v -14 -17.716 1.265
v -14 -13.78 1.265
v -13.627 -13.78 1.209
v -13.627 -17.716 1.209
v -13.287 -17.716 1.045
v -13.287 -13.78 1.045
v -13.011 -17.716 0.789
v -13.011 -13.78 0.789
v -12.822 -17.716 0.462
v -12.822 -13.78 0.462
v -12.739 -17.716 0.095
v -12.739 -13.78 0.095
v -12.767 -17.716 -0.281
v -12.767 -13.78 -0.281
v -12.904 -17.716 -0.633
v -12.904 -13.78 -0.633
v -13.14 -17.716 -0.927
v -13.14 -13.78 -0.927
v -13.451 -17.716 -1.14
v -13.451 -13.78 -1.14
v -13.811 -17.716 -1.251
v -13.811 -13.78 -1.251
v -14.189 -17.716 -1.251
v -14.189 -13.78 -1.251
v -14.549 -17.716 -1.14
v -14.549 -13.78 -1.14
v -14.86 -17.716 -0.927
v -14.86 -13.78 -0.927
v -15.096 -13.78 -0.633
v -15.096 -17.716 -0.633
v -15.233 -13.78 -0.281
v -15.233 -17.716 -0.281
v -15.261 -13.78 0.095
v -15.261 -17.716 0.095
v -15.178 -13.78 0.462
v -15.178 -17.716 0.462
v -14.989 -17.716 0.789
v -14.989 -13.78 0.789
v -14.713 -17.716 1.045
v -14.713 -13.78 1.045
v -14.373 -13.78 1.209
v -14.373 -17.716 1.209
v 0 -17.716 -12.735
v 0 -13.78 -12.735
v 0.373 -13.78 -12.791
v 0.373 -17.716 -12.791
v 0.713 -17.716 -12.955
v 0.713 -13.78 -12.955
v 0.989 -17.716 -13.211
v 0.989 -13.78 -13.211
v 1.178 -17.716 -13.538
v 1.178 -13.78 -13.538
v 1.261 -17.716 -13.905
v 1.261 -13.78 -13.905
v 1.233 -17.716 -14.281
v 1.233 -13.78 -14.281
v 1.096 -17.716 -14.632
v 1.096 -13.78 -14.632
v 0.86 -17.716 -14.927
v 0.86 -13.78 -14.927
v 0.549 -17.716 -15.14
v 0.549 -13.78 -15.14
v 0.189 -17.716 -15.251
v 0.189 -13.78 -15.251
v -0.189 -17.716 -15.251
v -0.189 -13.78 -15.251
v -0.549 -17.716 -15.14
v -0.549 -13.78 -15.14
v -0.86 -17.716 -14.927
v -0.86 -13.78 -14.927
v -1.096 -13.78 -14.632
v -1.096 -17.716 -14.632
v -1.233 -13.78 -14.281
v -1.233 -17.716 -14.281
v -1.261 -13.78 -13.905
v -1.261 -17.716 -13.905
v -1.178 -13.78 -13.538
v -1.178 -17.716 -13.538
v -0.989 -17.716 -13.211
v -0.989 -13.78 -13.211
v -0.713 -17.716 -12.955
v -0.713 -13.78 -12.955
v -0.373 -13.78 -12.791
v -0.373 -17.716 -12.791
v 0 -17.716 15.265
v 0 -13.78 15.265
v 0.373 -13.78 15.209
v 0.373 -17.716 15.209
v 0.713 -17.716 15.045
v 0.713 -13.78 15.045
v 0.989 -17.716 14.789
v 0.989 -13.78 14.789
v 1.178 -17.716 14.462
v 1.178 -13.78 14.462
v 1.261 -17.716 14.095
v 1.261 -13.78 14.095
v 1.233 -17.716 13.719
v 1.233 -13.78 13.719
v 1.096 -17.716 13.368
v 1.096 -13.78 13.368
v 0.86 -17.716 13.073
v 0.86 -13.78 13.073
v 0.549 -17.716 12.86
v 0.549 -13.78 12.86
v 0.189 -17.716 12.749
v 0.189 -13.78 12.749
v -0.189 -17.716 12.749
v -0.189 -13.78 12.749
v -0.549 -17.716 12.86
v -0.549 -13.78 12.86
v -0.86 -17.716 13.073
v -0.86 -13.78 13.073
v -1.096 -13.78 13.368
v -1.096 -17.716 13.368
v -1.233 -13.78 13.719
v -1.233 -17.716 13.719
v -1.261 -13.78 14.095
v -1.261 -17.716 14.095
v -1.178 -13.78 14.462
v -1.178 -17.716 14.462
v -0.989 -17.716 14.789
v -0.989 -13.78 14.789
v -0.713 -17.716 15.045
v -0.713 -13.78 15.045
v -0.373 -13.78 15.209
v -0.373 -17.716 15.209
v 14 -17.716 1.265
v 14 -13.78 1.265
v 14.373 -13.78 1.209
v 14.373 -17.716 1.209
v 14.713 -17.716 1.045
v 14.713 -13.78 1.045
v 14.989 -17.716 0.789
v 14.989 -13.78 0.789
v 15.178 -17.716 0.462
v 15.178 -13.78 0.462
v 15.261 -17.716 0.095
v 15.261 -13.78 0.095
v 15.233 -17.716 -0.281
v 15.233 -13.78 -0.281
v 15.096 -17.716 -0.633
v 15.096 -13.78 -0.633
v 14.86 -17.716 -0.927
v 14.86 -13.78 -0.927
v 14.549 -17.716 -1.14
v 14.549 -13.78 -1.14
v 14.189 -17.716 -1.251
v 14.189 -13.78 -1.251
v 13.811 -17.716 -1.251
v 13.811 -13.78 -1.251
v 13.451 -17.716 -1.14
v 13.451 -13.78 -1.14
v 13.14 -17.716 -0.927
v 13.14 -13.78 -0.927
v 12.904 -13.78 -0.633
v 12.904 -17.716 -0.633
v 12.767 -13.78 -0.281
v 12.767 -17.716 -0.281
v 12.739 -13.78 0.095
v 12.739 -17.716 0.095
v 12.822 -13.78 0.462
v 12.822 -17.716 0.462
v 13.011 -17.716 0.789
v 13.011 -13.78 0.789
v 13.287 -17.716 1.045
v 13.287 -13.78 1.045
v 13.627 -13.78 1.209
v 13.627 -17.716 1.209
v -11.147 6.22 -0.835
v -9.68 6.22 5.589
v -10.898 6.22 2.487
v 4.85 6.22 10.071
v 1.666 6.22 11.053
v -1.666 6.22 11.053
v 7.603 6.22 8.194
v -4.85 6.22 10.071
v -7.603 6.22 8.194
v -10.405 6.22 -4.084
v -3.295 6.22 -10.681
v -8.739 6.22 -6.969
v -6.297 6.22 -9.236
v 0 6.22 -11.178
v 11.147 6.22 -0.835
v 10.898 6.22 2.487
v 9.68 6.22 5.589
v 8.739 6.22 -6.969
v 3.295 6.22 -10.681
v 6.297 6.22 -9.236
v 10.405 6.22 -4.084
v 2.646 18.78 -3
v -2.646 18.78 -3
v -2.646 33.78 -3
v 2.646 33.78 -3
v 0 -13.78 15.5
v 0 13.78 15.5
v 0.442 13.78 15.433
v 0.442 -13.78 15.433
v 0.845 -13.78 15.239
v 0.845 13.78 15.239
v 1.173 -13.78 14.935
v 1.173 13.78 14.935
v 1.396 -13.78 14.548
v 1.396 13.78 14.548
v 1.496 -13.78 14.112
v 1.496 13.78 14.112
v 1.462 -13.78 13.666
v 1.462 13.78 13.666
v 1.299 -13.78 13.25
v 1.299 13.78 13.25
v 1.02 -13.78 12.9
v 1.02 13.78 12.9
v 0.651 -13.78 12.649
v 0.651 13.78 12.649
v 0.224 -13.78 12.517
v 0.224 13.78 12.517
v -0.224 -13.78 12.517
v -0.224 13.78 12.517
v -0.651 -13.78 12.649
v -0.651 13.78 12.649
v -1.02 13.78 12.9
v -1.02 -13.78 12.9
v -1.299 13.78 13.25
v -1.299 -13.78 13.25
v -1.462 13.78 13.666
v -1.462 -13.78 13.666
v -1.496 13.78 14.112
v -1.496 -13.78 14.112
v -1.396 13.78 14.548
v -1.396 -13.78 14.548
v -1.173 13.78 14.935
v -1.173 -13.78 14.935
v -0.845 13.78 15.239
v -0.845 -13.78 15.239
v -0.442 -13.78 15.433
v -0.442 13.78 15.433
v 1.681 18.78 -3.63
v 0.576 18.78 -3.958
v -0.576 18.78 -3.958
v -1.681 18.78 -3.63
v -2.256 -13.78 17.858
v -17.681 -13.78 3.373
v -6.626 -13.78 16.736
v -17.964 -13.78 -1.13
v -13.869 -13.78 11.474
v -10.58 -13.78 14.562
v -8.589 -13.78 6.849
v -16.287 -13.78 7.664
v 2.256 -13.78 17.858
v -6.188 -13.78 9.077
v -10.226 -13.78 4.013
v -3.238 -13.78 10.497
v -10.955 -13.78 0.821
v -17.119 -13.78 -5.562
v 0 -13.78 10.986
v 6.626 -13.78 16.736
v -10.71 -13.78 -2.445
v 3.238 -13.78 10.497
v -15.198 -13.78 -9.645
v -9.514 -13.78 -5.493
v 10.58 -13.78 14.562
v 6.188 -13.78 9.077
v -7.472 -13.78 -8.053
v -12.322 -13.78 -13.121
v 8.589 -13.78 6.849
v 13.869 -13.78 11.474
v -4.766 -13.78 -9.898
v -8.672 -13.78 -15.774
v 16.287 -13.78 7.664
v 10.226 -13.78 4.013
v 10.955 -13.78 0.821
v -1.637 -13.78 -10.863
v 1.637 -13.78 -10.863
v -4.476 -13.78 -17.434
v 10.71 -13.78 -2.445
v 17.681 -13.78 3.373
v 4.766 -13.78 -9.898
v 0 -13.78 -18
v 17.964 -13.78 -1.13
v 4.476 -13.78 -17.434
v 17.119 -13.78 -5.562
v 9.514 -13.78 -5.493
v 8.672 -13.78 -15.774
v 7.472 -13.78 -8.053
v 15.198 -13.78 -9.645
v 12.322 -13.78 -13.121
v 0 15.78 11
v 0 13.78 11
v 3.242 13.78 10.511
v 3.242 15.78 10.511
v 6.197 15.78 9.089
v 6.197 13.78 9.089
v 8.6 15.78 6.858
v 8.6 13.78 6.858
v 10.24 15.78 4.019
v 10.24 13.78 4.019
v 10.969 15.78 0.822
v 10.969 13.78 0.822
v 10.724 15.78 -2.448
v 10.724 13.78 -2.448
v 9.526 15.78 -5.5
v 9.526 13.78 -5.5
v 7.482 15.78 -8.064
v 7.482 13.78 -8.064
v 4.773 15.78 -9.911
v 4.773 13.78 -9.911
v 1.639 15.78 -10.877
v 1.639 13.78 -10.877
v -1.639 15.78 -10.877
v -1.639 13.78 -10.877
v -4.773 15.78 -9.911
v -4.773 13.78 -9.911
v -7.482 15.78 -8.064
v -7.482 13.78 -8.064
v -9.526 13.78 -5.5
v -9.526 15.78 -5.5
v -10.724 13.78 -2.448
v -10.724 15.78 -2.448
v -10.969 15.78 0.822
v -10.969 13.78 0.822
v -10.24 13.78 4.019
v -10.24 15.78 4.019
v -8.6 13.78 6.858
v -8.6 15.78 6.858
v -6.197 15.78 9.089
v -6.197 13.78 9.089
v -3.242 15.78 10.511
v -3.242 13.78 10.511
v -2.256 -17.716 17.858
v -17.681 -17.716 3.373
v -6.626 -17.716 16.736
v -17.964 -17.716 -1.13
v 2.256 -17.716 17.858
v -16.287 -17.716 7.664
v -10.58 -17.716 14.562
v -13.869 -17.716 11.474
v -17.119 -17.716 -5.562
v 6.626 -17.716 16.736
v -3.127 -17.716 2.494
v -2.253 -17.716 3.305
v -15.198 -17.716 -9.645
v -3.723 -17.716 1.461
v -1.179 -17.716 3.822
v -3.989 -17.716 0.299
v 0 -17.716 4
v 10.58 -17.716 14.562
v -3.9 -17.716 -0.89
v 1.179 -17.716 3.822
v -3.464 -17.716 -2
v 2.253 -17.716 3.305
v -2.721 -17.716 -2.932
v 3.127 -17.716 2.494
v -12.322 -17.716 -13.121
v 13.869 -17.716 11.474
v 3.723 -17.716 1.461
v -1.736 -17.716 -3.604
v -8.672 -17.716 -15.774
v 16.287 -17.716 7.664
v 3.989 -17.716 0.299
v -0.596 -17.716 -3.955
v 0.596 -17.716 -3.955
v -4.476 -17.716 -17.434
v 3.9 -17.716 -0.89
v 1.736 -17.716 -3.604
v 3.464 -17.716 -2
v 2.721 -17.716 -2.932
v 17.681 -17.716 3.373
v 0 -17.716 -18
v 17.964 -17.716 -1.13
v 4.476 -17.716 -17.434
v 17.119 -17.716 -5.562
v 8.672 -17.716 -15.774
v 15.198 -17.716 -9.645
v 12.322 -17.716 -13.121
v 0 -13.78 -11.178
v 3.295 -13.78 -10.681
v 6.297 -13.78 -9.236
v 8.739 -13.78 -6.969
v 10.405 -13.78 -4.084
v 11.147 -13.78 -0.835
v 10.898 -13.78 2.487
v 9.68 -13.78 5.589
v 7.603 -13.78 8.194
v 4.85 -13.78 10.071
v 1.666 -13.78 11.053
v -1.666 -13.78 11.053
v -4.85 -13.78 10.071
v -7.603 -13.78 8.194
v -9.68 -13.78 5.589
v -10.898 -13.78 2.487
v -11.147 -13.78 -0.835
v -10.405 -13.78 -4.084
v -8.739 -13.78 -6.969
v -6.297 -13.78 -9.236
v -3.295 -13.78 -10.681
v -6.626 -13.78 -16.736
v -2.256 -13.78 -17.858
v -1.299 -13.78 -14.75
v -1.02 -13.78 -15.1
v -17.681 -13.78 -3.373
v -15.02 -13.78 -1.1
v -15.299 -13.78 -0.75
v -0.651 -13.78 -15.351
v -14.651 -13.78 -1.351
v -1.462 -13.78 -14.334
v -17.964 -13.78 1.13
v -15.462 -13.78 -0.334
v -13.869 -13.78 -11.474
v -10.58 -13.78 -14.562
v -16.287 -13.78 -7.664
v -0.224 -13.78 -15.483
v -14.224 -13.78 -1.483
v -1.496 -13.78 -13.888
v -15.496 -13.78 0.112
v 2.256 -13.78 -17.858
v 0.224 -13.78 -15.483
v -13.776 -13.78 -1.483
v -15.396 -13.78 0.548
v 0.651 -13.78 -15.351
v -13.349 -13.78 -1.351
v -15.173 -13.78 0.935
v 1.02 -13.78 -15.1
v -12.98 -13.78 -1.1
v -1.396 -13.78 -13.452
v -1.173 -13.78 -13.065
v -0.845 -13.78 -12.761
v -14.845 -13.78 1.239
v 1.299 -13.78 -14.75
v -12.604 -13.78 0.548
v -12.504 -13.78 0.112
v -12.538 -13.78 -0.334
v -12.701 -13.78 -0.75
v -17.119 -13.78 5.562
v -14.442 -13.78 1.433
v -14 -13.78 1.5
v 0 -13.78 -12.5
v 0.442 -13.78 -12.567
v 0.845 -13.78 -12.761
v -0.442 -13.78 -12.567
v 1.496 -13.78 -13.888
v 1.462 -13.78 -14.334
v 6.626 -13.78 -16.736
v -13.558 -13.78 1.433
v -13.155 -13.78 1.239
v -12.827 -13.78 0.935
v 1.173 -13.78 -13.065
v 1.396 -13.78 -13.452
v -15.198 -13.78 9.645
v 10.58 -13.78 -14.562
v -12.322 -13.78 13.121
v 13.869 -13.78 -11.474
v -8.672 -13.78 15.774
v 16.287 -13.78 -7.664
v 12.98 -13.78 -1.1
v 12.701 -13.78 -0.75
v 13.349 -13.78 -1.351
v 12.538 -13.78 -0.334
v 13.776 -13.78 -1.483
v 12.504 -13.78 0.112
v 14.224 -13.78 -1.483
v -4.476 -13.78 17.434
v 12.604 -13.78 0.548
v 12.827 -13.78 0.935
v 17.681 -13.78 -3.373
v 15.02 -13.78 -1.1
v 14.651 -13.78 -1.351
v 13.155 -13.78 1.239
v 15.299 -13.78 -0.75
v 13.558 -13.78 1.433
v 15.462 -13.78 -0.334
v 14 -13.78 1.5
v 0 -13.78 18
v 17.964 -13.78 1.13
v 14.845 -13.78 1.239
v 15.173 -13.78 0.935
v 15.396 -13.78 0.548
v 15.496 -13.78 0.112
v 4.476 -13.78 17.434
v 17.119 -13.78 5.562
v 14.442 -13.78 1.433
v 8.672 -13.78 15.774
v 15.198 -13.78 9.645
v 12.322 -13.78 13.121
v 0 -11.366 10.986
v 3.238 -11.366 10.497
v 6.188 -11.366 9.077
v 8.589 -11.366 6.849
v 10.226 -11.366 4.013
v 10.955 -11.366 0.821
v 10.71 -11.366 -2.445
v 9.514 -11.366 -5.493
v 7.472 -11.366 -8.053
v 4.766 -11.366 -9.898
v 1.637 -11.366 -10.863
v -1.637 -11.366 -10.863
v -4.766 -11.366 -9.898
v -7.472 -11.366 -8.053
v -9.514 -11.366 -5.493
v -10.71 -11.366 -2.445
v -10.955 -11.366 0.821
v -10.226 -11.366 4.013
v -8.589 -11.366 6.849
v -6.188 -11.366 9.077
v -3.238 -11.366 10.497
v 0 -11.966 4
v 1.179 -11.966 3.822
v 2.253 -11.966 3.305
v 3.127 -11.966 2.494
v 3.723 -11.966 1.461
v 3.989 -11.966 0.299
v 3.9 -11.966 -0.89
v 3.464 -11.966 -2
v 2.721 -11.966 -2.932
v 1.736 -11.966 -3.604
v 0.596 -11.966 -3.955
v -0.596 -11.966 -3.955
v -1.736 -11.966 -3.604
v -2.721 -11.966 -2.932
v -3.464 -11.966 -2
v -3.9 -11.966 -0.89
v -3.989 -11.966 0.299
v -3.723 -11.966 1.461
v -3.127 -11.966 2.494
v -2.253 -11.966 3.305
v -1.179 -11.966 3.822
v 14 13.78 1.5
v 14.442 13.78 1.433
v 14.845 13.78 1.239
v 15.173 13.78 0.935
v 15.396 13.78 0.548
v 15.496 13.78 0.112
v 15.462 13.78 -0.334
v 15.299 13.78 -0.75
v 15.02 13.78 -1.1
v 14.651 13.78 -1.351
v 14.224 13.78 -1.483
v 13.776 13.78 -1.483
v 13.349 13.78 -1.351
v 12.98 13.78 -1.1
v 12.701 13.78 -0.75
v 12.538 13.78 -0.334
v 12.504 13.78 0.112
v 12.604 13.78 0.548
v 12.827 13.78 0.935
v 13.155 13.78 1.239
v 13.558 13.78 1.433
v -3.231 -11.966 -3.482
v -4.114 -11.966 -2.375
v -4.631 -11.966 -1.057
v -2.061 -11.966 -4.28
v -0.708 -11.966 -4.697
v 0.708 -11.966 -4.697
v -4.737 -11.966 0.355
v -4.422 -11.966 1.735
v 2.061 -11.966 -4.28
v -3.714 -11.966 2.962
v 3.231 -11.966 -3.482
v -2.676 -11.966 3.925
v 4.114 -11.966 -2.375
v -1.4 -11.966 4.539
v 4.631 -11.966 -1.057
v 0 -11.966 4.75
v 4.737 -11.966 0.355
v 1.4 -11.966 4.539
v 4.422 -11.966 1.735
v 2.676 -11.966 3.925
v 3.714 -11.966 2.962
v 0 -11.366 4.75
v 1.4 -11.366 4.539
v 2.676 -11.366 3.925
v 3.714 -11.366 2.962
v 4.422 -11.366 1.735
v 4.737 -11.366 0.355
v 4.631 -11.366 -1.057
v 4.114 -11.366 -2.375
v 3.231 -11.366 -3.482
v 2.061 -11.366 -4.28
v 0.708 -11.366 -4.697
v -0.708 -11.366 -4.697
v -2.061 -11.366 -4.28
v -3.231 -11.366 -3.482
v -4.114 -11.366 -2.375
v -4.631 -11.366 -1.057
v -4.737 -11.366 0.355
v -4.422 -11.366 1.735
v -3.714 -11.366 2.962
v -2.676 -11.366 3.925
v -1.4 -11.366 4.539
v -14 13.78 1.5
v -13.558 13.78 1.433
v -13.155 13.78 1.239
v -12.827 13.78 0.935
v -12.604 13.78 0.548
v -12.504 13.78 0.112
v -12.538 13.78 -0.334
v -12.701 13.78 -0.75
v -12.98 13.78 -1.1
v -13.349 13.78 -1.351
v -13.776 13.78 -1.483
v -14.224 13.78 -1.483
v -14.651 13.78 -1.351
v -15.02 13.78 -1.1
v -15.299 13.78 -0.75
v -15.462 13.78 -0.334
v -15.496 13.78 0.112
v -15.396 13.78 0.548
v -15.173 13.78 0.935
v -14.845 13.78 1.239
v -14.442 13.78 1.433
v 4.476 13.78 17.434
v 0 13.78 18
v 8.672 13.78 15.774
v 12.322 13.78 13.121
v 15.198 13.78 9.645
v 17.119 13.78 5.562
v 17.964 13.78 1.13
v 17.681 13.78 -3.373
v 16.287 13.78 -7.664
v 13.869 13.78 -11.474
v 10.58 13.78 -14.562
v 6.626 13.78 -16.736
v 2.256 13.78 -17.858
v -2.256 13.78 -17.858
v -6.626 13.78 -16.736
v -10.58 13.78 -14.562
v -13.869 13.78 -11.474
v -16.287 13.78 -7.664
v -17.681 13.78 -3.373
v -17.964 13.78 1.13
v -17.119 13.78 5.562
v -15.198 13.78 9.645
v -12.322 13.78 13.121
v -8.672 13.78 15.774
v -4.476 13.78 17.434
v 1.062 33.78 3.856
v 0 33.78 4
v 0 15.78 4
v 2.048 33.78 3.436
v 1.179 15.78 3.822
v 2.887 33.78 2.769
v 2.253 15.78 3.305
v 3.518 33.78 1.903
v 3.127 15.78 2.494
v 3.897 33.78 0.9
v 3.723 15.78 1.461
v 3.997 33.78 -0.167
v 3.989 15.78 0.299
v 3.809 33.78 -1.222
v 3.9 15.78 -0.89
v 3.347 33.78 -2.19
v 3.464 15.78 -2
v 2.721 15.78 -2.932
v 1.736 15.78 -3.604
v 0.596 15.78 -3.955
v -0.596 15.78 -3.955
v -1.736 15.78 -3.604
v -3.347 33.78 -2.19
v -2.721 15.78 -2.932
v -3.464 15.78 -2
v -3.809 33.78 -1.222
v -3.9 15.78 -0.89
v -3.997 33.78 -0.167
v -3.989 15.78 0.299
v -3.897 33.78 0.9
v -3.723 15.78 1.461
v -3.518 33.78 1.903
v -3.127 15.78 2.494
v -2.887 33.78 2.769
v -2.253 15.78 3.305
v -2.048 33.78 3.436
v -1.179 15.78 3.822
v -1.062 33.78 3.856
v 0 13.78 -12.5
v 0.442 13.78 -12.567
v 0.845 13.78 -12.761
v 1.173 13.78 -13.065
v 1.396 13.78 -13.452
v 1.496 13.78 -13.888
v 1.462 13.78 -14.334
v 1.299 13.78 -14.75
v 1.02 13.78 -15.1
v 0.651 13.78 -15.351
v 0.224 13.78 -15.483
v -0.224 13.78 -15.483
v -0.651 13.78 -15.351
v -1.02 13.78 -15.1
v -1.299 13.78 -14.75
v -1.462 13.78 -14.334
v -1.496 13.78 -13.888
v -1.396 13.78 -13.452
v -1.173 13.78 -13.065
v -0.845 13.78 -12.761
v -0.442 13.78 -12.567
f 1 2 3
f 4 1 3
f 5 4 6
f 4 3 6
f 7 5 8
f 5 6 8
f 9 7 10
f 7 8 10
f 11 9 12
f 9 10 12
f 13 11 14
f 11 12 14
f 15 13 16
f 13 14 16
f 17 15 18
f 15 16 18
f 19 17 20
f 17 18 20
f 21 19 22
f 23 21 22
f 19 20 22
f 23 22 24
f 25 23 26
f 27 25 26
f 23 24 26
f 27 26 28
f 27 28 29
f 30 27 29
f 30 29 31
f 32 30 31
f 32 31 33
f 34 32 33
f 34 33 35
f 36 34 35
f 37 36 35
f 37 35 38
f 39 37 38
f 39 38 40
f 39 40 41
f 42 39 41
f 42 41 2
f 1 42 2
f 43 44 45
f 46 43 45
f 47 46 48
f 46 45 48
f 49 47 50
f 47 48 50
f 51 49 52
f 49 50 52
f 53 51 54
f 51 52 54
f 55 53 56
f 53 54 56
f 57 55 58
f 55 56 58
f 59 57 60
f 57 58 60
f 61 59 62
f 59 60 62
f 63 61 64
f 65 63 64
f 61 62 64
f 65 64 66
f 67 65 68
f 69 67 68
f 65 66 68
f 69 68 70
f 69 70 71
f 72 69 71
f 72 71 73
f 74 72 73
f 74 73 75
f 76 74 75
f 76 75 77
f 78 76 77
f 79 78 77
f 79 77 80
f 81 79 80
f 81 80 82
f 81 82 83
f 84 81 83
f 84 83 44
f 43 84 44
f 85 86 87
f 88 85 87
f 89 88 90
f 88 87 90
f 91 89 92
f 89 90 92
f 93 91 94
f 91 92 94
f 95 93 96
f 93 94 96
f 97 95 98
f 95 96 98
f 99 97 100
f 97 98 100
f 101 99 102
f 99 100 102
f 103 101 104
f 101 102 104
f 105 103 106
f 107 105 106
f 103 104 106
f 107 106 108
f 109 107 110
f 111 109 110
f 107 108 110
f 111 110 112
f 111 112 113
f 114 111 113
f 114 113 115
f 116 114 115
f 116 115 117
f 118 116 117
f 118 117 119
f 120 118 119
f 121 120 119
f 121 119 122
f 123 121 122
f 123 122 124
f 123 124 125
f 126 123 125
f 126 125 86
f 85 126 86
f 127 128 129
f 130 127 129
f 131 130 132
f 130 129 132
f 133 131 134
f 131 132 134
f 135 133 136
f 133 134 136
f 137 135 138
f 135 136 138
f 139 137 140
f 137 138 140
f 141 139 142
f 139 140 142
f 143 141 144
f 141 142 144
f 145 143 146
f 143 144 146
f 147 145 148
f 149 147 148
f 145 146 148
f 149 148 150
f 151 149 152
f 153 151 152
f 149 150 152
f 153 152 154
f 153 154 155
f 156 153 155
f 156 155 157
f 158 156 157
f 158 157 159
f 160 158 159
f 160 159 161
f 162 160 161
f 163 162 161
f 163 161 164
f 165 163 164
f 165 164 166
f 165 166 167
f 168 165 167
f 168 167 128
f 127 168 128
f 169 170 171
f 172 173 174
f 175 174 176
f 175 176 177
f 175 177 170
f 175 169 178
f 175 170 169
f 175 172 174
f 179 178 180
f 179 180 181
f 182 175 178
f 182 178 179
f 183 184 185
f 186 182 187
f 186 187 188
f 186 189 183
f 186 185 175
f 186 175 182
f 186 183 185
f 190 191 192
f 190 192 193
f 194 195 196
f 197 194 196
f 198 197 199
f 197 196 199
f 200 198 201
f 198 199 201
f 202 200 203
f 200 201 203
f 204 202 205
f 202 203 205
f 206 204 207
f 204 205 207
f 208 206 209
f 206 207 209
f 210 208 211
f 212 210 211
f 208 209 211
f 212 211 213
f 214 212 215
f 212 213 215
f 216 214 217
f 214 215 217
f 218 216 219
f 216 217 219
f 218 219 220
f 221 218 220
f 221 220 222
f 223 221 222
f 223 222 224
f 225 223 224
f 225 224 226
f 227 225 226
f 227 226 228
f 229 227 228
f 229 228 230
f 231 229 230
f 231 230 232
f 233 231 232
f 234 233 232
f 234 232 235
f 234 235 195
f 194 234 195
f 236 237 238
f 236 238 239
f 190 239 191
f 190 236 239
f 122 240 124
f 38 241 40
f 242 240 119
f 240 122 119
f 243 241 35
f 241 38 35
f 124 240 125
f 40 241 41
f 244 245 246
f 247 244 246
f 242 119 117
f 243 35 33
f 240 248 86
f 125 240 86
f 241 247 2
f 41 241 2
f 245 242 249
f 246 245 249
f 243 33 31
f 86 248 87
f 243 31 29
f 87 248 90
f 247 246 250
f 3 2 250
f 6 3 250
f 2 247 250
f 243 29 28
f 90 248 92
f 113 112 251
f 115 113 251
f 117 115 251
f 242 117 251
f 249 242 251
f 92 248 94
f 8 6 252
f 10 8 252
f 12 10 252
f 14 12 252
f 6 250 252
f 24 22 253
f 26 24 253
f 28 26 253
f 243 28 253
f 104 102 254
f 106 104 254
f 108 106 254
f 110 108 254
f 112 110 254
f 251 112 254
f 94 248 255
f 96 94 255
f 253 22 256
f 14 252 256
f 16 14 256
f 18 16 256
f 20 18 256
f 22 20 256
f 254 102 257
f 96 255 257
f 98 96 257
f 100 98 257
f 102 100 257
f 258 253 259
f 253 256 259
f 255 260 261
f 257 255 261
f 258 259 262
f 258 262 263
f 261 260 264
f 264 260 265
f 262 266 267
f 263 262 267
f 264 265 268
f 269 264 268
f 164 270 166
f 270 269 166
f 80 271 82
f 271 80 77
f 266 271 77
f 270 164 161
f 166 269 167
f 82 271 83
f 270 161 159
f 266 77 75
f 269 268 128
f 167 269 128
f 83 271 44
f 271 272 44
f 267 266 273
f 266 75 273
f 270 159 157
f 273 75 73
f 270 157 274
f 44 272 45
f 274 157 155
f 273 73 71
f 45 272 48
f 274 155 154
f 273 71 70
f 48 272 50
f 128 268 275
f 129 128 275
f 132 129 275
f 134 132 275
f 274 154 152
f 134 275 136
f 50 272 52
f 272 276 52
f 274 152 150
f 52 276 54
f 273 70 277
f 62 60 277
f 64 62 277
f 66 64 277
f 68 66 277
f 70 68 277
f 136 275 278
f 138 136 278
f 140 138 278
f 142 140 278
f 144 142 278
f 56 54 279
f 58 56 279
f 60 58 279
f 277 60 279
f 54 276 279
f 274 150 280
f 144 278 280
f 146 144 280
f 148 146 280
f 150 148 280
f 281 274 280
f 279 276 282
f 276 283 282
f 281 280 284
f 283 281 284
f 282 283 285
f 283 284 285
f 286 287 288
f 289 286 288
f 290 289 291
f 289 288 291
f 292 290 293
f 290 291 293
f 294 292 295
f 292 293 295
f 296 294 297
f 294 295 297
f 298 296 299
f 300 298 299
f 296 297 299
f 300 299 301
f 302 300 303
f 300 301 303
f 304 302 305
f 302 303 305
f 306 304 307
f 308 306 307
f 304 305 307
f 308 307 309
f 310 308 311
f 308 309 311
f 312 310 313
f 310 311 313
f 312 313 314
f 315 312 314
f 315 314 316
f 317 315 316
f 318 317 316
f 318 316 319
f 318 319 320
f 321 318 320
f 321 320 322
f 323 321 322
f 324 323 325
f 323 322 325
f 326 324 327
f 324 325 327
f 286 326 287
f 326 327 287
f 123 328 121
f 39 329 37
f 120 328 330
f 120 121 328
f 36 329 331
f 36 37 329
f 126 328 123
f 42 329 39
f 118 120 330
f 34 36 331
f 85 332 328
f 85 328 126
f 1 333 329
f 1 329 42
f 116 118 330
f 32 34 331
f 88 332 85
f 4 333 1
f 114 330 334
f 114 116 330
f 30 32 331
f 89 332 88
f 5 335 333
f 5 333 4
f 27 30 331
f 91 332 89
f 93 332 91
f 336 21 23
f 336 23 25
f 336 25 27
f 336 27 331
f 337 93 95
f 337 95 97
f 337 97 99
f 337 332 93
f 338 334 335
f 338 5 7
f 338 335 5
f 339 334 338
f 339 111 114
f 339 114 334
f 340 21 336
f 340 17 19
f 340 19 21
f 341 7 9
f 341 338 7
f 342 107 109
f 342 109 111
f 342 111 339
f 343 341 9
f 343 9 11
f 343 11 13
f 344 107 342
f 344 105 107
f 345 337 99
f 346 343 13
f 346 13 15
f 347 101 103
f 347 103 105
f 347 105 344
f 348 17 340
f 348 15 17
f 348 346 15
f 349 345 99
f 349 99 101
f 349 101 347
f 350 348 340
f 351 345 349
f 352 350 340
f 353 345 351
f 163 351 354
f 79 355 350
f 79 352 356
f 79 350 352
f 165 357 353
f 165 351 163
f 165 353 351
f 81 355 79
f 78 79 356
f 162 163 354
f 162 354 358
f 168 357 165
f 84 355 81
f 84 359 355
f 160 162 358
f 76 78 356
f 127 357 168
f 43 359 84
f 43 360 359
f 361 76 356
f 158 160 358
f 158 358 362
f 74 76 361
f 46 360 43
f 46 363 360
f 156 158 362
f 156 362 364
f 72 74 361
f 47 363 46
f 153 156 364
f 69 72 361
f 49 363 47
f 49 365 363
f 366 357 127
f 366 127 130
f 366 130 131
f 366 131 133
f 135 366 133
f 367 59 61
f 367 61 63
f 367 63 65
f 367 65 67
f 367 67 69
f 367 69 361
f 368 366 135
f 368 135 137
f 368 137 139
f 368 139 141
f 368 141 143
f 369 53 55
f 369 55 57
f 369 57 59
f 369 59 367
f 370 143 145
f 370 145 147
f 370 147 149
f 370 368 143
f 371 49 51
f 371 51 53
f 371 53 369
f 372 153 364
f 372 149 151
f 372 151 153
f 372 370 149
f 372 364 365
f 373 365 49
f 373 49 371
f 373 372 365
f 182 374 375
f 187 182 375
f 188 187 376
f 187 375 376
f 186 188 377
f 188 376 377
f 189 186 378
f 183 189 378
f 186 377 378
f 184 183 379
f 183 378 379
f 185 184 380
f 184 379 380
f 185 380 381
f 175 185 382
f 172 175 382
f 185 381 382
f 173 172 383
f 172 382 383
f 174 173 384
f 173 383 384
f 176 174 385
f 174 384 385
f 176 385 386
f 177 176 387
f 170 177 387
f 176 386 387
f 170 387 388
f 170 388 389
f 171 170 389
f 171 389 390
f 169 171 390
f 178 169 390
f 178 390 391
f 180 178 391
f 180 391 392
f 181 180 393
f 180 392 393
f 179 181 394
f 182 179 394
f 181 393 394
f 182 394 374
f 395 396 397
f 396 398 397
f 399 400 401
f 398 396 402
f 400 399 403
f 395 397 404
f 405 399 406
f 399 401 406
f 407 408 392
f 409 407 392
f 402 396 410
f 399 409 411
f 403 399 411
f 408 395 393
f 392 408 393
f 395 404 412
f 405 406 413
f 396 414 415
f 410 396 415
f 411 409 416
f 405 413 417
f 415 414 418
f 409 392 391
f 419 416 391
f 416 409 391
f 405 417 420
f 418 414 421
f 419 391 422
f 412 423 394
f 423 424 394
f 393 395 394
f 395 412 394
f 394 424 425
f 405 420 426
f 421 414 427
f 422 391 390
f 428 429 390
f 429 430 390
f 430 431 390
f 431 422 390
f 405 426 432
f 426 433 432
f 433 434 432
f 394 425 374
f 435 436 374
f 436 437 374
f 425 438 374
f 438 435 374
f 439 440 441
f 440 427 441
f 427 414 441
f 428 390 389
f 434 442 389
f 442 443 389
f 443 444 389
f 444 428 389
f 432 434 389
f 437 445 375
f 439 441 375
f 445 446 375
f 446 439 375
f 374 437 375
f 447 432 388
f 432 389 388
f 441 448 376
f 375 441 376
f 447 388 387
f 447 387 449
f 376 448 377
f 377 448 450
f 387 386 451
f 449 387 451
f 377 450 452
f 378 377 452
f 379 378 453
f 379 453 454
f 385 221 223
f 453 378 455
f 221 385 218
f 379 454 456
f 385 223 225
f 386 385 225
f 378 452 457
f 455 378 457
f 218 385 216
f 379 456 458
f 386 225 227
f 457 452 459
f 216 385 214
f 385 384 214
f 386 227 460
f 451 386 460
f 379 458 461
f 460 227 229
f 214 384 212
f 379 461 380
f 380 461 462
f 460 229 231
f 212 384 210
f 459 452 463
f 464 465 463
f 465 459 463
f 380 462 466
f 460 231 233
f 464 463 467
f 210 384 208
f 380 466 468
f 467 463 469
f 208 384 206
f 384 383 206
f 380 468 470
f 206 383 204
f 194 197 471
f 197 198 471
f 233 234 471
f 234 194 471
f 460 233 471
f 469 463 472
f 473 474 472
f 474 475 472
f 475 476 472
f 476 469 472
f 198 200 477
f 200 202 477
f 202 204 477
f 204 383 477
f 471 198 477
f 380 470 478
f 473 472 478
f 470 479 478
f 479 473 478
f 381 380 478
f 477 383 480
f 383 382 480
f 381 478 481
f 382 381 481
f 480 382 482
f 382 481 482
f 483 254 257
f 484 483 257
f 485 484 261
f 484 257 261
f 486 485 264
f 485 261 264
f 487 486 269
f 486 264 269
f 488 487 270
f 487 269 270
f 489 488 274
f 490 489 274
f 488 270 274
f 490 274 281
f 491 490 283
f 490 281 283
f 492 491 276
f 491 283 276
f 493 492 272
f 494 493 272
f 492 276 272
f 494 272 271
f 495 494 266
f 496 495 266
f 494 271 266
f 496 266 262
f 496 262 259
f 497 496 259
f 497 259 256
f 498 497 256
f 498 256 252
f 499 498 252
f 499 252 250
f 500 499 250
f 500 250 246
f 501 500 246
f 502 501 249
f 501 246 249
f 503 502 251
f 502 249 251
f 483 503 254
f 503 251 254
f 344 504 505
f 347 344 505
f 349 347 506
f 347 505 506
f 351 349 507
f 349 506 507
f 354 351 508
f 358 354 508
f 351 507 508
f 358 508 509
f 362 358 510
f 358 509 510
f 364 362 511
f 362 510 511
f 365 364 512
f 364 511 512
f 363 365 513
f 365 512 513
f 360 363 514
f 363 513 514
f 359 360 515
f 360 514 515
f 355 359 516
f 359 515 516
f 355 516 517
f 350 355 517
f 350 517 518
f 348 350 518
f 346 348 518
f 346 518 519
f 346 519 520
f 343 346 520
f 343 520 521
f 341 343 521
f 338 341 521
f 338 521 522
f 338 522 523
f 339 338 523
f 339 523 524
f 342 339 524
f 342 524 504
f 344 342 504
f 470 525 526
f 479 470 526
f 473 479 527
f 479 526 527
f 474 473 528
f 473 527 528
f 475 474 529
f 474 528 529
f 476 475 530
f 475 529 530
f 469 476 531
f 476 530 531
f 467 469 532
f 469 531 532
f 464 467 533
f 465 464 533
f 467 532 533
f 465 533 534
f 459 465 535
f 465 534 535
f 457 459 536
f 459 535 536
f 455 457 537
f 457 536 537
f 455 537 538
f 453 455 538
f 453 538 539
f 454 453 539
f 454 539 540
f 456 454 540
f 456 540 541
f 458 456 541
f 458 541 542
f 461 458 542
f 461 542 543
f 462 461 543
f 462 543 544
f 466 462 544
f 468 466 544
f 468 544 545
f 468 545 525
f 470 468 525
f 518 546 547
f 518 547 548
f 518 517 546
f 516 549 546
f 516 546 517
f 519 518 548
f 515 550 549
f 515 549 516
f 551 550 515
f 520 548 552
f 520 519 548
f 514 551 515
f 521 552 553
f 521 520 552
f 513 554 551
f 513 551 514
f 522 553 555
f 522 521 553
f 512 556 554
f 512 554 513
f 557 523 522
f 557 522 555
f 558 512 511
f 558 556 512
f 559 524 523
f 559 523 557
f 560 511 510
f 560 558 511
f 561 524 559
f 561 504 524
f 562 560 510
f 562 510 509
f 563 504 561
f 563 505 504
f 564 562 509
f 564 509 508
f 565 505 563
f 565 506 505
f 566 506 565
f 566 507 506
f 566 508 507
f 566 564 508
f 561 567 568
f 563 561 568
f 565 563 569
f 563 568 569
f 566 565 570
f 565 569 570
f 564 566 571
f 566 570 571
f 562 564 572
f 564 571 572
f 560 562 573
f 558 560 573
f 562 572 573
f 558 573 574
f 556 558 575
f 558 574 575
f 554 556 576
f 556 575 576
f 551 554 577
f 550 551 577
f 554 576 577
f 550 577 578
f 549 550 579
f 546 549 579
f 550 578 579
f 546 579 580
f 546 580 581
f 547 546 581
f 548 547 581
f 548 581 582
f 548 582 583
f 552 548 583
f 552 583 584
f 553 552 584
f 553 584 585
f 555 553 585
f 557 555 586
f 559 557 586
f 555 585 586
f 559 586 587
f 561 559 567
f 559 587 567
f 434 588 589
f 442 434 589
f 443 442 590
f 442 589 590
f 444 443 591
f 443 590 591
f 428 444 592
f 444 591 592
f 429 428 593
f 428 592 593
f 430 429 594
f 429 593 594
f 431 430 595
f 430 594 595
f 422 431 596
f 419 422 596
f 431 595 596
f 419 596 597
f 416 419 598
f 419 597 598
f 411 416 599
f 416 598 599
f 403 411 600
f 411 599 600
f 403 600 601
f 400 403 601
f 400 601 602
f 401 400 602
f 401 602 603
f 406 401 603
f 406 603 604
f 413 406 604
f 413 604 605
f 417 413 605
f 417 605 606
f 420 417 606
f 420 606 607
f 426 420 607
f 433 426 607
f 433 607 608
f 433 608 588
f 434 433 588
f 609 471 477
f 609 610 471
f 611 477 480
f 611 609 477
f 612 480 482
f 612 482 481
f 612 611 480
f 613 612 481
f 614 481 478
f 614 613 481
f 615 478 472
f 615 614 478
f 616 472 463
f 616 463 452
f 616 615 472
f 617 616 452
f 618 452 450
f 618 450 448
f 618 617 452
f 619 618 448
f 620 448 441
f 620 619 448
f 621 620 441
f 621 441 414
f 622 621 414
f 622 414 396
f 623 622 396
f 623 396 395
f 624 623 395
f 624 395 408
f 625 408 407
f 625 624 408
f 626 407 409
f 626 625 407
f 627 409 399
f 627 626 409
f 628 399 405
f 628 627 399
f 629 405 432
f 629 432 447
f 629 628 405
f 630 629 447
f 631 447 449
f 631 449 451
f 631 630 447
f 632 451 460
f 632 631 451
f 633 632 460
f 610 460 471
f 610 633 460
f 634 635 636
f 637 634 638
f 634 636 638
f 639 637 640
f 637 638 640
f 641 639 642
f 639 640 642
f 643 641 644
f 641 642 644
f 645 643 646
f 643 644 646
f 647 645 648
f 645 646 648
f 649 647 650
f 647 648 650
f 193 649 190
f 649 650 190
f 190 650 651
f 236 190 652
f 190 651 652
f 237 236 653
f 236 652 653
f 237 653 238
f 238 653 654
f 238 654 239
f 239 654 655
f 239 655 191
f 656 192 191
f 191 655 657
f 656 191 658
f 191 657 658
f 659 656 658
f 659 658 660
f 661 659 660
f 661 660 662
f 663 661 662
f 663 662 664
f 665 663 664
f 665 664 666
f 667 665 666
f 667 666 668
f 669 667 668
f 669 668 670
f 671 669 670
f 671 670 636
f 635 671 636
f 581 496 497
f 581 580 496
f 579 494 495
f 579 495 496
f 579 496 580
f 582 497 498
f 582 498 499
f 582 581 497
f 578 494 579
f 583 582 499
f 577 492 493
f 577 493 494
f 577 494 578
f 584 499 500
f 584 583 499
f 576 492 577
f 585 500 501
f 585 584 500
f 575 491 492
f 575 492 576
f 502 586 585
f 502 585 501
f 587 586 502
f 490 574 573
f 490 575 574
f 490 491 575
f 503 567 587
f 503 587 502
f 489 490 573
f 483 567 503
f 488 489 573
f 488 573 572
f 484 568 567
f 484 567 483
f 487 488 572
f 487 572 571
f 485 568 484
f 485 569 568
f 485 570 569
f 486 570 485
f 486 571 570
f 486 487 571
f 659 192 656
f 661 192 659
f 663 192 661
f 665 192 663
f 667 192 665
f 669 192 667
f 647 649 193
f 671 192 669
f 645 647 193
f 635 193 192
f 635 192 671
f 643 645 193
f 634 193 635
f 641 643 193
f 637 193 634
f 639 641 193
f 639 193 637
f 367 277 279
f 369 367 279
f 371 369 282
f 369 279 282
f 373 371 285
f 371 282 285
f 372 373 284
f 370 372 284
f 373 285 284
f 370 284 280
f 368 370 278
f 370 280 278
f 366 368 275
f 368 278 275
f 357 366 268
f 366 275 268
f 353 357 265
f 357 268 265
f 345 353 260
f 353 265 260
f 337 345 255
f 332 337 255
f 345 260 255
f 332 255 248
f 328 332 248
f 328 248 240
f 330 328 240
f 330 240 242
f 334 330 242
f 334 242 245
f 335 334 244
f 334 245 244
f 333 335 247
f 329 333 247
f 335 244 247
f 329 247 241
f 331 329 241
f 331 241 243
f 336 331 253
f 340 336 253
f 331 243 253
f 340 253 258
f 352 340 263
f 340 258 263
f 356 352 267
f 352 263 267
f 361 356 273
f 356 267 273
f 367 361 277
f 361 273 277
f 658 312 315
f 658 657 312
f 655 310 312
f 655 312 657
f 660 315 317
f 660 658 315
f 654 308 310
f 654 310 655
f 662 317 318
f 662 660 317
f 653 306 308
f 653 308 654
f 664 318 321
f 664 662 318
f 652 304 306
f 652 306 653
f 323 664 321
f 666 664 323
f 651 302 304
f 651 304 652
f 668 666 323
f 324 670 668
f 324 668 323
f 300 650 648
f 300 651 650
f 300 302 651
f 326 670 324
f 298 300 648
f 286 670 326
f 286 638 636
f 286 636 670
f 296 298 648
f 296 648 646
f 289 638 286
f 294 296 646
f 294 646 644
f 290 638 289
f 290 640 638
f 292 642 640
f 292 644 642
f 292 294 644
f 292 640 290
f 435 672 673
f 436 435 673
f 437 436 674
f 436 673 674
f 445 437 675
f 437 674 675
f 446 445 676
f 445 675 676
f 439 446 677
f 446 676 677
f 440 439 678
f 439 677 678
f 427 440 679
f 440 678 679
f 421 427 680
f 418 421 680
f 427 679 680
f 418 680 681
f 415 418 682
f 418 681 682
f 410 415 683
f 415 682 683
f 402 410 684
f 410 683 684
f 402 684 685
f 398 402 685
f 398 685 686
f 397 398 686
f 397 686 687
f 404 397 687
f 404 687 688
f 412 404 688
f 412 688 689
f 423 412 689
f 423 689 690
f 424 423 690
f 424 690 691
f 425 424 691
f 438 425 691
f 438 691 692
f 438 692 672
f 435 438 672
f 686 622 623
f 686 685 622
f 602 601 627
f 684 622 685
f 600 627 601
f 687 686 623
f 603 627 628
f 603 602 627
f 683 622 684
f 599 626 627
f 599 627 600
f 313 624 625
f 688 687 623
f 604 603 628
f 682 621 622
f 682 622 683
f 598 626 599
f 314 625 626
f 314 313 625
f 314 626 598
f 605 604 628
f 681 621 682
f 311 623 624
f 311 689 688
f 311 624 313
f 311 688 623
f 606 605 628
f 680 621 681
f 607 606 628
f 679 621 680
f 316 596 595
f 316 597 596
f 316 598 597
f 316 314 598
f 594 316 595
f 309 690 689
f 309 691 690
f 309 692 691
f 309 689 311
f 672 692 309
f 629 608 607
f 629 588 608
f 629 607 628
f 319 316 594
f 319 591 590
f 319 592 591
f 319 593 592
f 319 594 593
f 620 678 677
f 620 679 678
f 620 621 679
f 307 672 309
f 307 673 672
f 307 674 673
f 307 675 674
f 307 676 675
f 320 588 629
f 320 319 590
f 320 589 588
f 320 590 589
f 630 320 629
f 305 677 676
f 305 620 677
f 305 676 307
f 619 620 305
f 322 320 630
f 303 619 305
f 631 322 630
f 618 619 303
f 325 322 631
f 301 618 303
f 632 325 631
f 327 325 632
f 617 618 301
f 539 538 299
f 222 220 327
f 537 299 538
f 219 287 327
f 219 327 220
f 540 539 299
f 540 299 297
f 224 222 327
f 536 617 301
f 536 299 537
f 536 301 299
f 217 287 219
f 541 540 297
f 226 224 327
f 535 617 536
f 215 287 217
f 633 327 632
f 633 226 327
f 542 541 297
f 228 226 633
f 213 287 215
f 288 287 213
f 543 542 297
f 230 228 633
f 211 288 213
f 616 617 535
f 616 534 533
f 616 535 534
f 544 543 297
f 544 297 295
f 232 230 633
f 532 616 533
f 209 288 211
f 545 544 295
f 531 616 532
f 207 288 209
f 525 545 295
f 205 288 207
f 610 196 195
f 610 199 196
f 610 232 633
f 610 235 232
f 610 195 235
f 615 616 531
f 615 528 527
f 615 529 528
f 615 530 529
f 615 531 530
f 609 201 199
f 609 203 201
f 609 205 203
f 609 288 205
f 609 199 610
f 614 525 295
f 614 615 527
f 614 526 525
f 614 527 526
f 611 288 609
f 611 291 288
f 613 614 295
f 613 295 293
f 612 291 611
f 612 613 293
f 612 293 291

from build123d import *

# Parameters (mm, degrees)
SKETCH1_R           = 18
BOSS_EXTRUDE1_DEPTH = 13.7795
SKETCH2_R           = 11
BOSS_EXTRUDE2_DEPTH = 2
SKETCH3_R           = 4
BOSS_EXTRUDE4_DEPTH = 18
CUT_EXTRUDE1_START  = -15
CUT_EXTRUDE1_DEPTH  = 15
SKETCH5_R           = 1.5
CUT_EXTRUDE2_DEPTH  = 38.51664272
SKETCH6_R           = 11.178
CUT_EXTRUDE3_DEPTH  = 20
SKETCH7_R           = 18
BOSS_EXTRUDE5_DEPTH = 3.937
SKETCH8_R           = 10.9855
BOSS_EXTRUDE6_DEPTH = 2.413
SKETCH9_R           = 1.265
CUT_EXTRUDE4_DEPTH  = 54.94310411
SKETCH10_R          = 4
CUT_EXTRUDE5_DEPTH  = 52.82819036
SKETCH11_R          = 4.75
CUT_EXTRUDE6_DEPTH  = 0.6


with BuildPart() as part:
    # Sketch1 → Boss-Extrude1 (new, symmetric)
    with BuildSketch(Plane(origin=(0, 0, 0), x_dir=(1, 0, 0), z_dir=(0, 1, 0))):
        with Locations(Location((0, 0, 0), (0, 0, 270))):
            Circle(SKETCH1_R)
    extrude(amount=BOSS_EXTRUDE1_DEPTH, both=True)

    # Sketch2 → Boss-Extrude2 (add)
    with BuildSketch(Plane(origin=(0, 13.7795, 0), x_dir=(1, 0, 0), z_dir=(0, 1, 0))):
        with Locations(Location((0, 0, 0), (0, 0, 270))):
            Circle(SKETCH2_R)
    extrude(amount=BOSS_EXTRUDE2_DEPTH)

    # Sketch3 → Boss-Extrude4 (add)
    with BuildSketch(Plane(origin=(0, 15.7795, 0), x_dir=(1, 0, 0), z_dir=(0, 1, 0))):
        with Locations(Location((0, 0, 0), (0, 0, 270))):
            Circle(SKETCH3_R)
    extrude(amount=BOSS_EXTRUDE4_DEPTH)

    # Sketch4 → Cut-Extrude1 (cut)
    with BuildSketch(Plane(origin=(0, 33.7795, 0), x_dir=(1, 0, 0), z_dir=(0, 1, 0)).offset(CUT_EXTRUDE1_START)):
        with BuildLine():
            Line((-2.645751311, 3), (2.645751311, 3))
            ThreePointArc((2.645751311, 3), (0, 4), (-2.645751311, 3))
        make_face()
    extrude(amount=CUT_EXTRUDE1_DEPTH, mode=Mode.SUBTRACT)

    # Sketch5 → Cut-Extrude2 (cut, through all)
    with BuildSketch(Plane(origin=(0, 13.7795, 0), x_dir=(1, 0, 0), z_dir=(0, 1, 0))):
        with Locations(Location((0, 14, 0), (0, 0, 270))):
            Circle(SKETCH5_R)
        with Locations(Location((-14, 0, 0), (0, 0, 270))):
            Circle(SKETCH5_R)
        with Locations(Location((0, -14, 0), (0, 0, 270))):
            Circle(SKETCH5_R)
        with Locations(Location((14, 0, 0), (0, 0, 270))):
            Circle(SKETCH5_R)
    extrude(amount=-CUT_EXTRUDE2_DEPTH, mode=Mode.SUBTRACT)

    # Sketch6 → Cut-Extrude3 (cut)
    with BuildSketch(Plane.XZ.offset(13.7795)):
        with Locations(Location((0, 0, 0), (0, 0, 270))):
            Circle(SKETCH6_R)
    extrude(amount=-CUT_EXTRUDE3_DEPTH, mode=Mode.SUBTRACT)


with BuildPart() as body_2:
    # Sketch7 → Boss-Extrude5 (new body)
    with BuildSketch(Plane.XZ.offset(13.7795)):
        with Locations(Location((0, 0, 0), (0, 0, 270))):
            Circle(SKETCH7_R)
    extrude(amount=BOSS_EXTRUDE5_DEPTH)

    # Sketch8 → Boss-Extrude6 (add)
    with BuildSketch(Plane(origin=(0, -13.7795, 0), x_dir=(1, 0, 0), z_dir=(0, 1, 0))):
        with Locations(Location((0, 0, 0), (0, 0, 270))):
            Circle(SKETCH8_R)
    extrude(amount=BOSS_EXTRUDE6_DEPTH)

    # Sketch9 → Cut-Extrude4 (cut, through all)
    with BuildSketch(Plane(origin=(0, -13.7795, 0), x_dir=(1, 0, 0), z_dir=(0, 1, 0))):
        with Locations(Location((0, 14, 0), (0, 0, 270))):
            Circle(SKETCH9_R)
        with Locations(Location((14, 0, 0), (0, 0, 270))):
            Circle(SKETCH9_R)
        with Locations(Location((0, -14, 0), (0, 0, 270))):
            Circle(SKETCH9_R)
        with Locations(Location((-14, 0, 0), (0, 0, 270))):
            Circle(SKETCH9_R)
    extrude(amount=-CUT_EXTRUDE4_DEPTH, mode=Mode.SUBTRACT)

    # Sketch10 → Cut-Extrude5 (cut, through all)
    with BuildSketch(Plane(origin=(0, -11.3665, 0), x_dir=(1, 0, 0), z_dir=(0, 1, 0))):
        with Locations(Location((0, 0, 0), (0, 0, 270))):
            Circle(SKETCH10_R)
    extrude(amount=-CUT_EXTRUDE5_DEPTH, mode=Mode.SUBTRACT)

    # Sketch11 → Cut-Extrude6 (cut)
    with BuildSketch(Plane(origin=(0, -11.3665, 0), x_dir=(1, 0, 0), z_dir=(0, 1, 0))):
        with Locations(Location((0, 0, 0), (0, 0, 270))):
            Circle(SKETCH11_R)
    extrude(amount=-CUT_EXTRUDE6_DEPTH, mode=Mode.SUBTRACT)


solid = Compound([part.part, body_2.part])
